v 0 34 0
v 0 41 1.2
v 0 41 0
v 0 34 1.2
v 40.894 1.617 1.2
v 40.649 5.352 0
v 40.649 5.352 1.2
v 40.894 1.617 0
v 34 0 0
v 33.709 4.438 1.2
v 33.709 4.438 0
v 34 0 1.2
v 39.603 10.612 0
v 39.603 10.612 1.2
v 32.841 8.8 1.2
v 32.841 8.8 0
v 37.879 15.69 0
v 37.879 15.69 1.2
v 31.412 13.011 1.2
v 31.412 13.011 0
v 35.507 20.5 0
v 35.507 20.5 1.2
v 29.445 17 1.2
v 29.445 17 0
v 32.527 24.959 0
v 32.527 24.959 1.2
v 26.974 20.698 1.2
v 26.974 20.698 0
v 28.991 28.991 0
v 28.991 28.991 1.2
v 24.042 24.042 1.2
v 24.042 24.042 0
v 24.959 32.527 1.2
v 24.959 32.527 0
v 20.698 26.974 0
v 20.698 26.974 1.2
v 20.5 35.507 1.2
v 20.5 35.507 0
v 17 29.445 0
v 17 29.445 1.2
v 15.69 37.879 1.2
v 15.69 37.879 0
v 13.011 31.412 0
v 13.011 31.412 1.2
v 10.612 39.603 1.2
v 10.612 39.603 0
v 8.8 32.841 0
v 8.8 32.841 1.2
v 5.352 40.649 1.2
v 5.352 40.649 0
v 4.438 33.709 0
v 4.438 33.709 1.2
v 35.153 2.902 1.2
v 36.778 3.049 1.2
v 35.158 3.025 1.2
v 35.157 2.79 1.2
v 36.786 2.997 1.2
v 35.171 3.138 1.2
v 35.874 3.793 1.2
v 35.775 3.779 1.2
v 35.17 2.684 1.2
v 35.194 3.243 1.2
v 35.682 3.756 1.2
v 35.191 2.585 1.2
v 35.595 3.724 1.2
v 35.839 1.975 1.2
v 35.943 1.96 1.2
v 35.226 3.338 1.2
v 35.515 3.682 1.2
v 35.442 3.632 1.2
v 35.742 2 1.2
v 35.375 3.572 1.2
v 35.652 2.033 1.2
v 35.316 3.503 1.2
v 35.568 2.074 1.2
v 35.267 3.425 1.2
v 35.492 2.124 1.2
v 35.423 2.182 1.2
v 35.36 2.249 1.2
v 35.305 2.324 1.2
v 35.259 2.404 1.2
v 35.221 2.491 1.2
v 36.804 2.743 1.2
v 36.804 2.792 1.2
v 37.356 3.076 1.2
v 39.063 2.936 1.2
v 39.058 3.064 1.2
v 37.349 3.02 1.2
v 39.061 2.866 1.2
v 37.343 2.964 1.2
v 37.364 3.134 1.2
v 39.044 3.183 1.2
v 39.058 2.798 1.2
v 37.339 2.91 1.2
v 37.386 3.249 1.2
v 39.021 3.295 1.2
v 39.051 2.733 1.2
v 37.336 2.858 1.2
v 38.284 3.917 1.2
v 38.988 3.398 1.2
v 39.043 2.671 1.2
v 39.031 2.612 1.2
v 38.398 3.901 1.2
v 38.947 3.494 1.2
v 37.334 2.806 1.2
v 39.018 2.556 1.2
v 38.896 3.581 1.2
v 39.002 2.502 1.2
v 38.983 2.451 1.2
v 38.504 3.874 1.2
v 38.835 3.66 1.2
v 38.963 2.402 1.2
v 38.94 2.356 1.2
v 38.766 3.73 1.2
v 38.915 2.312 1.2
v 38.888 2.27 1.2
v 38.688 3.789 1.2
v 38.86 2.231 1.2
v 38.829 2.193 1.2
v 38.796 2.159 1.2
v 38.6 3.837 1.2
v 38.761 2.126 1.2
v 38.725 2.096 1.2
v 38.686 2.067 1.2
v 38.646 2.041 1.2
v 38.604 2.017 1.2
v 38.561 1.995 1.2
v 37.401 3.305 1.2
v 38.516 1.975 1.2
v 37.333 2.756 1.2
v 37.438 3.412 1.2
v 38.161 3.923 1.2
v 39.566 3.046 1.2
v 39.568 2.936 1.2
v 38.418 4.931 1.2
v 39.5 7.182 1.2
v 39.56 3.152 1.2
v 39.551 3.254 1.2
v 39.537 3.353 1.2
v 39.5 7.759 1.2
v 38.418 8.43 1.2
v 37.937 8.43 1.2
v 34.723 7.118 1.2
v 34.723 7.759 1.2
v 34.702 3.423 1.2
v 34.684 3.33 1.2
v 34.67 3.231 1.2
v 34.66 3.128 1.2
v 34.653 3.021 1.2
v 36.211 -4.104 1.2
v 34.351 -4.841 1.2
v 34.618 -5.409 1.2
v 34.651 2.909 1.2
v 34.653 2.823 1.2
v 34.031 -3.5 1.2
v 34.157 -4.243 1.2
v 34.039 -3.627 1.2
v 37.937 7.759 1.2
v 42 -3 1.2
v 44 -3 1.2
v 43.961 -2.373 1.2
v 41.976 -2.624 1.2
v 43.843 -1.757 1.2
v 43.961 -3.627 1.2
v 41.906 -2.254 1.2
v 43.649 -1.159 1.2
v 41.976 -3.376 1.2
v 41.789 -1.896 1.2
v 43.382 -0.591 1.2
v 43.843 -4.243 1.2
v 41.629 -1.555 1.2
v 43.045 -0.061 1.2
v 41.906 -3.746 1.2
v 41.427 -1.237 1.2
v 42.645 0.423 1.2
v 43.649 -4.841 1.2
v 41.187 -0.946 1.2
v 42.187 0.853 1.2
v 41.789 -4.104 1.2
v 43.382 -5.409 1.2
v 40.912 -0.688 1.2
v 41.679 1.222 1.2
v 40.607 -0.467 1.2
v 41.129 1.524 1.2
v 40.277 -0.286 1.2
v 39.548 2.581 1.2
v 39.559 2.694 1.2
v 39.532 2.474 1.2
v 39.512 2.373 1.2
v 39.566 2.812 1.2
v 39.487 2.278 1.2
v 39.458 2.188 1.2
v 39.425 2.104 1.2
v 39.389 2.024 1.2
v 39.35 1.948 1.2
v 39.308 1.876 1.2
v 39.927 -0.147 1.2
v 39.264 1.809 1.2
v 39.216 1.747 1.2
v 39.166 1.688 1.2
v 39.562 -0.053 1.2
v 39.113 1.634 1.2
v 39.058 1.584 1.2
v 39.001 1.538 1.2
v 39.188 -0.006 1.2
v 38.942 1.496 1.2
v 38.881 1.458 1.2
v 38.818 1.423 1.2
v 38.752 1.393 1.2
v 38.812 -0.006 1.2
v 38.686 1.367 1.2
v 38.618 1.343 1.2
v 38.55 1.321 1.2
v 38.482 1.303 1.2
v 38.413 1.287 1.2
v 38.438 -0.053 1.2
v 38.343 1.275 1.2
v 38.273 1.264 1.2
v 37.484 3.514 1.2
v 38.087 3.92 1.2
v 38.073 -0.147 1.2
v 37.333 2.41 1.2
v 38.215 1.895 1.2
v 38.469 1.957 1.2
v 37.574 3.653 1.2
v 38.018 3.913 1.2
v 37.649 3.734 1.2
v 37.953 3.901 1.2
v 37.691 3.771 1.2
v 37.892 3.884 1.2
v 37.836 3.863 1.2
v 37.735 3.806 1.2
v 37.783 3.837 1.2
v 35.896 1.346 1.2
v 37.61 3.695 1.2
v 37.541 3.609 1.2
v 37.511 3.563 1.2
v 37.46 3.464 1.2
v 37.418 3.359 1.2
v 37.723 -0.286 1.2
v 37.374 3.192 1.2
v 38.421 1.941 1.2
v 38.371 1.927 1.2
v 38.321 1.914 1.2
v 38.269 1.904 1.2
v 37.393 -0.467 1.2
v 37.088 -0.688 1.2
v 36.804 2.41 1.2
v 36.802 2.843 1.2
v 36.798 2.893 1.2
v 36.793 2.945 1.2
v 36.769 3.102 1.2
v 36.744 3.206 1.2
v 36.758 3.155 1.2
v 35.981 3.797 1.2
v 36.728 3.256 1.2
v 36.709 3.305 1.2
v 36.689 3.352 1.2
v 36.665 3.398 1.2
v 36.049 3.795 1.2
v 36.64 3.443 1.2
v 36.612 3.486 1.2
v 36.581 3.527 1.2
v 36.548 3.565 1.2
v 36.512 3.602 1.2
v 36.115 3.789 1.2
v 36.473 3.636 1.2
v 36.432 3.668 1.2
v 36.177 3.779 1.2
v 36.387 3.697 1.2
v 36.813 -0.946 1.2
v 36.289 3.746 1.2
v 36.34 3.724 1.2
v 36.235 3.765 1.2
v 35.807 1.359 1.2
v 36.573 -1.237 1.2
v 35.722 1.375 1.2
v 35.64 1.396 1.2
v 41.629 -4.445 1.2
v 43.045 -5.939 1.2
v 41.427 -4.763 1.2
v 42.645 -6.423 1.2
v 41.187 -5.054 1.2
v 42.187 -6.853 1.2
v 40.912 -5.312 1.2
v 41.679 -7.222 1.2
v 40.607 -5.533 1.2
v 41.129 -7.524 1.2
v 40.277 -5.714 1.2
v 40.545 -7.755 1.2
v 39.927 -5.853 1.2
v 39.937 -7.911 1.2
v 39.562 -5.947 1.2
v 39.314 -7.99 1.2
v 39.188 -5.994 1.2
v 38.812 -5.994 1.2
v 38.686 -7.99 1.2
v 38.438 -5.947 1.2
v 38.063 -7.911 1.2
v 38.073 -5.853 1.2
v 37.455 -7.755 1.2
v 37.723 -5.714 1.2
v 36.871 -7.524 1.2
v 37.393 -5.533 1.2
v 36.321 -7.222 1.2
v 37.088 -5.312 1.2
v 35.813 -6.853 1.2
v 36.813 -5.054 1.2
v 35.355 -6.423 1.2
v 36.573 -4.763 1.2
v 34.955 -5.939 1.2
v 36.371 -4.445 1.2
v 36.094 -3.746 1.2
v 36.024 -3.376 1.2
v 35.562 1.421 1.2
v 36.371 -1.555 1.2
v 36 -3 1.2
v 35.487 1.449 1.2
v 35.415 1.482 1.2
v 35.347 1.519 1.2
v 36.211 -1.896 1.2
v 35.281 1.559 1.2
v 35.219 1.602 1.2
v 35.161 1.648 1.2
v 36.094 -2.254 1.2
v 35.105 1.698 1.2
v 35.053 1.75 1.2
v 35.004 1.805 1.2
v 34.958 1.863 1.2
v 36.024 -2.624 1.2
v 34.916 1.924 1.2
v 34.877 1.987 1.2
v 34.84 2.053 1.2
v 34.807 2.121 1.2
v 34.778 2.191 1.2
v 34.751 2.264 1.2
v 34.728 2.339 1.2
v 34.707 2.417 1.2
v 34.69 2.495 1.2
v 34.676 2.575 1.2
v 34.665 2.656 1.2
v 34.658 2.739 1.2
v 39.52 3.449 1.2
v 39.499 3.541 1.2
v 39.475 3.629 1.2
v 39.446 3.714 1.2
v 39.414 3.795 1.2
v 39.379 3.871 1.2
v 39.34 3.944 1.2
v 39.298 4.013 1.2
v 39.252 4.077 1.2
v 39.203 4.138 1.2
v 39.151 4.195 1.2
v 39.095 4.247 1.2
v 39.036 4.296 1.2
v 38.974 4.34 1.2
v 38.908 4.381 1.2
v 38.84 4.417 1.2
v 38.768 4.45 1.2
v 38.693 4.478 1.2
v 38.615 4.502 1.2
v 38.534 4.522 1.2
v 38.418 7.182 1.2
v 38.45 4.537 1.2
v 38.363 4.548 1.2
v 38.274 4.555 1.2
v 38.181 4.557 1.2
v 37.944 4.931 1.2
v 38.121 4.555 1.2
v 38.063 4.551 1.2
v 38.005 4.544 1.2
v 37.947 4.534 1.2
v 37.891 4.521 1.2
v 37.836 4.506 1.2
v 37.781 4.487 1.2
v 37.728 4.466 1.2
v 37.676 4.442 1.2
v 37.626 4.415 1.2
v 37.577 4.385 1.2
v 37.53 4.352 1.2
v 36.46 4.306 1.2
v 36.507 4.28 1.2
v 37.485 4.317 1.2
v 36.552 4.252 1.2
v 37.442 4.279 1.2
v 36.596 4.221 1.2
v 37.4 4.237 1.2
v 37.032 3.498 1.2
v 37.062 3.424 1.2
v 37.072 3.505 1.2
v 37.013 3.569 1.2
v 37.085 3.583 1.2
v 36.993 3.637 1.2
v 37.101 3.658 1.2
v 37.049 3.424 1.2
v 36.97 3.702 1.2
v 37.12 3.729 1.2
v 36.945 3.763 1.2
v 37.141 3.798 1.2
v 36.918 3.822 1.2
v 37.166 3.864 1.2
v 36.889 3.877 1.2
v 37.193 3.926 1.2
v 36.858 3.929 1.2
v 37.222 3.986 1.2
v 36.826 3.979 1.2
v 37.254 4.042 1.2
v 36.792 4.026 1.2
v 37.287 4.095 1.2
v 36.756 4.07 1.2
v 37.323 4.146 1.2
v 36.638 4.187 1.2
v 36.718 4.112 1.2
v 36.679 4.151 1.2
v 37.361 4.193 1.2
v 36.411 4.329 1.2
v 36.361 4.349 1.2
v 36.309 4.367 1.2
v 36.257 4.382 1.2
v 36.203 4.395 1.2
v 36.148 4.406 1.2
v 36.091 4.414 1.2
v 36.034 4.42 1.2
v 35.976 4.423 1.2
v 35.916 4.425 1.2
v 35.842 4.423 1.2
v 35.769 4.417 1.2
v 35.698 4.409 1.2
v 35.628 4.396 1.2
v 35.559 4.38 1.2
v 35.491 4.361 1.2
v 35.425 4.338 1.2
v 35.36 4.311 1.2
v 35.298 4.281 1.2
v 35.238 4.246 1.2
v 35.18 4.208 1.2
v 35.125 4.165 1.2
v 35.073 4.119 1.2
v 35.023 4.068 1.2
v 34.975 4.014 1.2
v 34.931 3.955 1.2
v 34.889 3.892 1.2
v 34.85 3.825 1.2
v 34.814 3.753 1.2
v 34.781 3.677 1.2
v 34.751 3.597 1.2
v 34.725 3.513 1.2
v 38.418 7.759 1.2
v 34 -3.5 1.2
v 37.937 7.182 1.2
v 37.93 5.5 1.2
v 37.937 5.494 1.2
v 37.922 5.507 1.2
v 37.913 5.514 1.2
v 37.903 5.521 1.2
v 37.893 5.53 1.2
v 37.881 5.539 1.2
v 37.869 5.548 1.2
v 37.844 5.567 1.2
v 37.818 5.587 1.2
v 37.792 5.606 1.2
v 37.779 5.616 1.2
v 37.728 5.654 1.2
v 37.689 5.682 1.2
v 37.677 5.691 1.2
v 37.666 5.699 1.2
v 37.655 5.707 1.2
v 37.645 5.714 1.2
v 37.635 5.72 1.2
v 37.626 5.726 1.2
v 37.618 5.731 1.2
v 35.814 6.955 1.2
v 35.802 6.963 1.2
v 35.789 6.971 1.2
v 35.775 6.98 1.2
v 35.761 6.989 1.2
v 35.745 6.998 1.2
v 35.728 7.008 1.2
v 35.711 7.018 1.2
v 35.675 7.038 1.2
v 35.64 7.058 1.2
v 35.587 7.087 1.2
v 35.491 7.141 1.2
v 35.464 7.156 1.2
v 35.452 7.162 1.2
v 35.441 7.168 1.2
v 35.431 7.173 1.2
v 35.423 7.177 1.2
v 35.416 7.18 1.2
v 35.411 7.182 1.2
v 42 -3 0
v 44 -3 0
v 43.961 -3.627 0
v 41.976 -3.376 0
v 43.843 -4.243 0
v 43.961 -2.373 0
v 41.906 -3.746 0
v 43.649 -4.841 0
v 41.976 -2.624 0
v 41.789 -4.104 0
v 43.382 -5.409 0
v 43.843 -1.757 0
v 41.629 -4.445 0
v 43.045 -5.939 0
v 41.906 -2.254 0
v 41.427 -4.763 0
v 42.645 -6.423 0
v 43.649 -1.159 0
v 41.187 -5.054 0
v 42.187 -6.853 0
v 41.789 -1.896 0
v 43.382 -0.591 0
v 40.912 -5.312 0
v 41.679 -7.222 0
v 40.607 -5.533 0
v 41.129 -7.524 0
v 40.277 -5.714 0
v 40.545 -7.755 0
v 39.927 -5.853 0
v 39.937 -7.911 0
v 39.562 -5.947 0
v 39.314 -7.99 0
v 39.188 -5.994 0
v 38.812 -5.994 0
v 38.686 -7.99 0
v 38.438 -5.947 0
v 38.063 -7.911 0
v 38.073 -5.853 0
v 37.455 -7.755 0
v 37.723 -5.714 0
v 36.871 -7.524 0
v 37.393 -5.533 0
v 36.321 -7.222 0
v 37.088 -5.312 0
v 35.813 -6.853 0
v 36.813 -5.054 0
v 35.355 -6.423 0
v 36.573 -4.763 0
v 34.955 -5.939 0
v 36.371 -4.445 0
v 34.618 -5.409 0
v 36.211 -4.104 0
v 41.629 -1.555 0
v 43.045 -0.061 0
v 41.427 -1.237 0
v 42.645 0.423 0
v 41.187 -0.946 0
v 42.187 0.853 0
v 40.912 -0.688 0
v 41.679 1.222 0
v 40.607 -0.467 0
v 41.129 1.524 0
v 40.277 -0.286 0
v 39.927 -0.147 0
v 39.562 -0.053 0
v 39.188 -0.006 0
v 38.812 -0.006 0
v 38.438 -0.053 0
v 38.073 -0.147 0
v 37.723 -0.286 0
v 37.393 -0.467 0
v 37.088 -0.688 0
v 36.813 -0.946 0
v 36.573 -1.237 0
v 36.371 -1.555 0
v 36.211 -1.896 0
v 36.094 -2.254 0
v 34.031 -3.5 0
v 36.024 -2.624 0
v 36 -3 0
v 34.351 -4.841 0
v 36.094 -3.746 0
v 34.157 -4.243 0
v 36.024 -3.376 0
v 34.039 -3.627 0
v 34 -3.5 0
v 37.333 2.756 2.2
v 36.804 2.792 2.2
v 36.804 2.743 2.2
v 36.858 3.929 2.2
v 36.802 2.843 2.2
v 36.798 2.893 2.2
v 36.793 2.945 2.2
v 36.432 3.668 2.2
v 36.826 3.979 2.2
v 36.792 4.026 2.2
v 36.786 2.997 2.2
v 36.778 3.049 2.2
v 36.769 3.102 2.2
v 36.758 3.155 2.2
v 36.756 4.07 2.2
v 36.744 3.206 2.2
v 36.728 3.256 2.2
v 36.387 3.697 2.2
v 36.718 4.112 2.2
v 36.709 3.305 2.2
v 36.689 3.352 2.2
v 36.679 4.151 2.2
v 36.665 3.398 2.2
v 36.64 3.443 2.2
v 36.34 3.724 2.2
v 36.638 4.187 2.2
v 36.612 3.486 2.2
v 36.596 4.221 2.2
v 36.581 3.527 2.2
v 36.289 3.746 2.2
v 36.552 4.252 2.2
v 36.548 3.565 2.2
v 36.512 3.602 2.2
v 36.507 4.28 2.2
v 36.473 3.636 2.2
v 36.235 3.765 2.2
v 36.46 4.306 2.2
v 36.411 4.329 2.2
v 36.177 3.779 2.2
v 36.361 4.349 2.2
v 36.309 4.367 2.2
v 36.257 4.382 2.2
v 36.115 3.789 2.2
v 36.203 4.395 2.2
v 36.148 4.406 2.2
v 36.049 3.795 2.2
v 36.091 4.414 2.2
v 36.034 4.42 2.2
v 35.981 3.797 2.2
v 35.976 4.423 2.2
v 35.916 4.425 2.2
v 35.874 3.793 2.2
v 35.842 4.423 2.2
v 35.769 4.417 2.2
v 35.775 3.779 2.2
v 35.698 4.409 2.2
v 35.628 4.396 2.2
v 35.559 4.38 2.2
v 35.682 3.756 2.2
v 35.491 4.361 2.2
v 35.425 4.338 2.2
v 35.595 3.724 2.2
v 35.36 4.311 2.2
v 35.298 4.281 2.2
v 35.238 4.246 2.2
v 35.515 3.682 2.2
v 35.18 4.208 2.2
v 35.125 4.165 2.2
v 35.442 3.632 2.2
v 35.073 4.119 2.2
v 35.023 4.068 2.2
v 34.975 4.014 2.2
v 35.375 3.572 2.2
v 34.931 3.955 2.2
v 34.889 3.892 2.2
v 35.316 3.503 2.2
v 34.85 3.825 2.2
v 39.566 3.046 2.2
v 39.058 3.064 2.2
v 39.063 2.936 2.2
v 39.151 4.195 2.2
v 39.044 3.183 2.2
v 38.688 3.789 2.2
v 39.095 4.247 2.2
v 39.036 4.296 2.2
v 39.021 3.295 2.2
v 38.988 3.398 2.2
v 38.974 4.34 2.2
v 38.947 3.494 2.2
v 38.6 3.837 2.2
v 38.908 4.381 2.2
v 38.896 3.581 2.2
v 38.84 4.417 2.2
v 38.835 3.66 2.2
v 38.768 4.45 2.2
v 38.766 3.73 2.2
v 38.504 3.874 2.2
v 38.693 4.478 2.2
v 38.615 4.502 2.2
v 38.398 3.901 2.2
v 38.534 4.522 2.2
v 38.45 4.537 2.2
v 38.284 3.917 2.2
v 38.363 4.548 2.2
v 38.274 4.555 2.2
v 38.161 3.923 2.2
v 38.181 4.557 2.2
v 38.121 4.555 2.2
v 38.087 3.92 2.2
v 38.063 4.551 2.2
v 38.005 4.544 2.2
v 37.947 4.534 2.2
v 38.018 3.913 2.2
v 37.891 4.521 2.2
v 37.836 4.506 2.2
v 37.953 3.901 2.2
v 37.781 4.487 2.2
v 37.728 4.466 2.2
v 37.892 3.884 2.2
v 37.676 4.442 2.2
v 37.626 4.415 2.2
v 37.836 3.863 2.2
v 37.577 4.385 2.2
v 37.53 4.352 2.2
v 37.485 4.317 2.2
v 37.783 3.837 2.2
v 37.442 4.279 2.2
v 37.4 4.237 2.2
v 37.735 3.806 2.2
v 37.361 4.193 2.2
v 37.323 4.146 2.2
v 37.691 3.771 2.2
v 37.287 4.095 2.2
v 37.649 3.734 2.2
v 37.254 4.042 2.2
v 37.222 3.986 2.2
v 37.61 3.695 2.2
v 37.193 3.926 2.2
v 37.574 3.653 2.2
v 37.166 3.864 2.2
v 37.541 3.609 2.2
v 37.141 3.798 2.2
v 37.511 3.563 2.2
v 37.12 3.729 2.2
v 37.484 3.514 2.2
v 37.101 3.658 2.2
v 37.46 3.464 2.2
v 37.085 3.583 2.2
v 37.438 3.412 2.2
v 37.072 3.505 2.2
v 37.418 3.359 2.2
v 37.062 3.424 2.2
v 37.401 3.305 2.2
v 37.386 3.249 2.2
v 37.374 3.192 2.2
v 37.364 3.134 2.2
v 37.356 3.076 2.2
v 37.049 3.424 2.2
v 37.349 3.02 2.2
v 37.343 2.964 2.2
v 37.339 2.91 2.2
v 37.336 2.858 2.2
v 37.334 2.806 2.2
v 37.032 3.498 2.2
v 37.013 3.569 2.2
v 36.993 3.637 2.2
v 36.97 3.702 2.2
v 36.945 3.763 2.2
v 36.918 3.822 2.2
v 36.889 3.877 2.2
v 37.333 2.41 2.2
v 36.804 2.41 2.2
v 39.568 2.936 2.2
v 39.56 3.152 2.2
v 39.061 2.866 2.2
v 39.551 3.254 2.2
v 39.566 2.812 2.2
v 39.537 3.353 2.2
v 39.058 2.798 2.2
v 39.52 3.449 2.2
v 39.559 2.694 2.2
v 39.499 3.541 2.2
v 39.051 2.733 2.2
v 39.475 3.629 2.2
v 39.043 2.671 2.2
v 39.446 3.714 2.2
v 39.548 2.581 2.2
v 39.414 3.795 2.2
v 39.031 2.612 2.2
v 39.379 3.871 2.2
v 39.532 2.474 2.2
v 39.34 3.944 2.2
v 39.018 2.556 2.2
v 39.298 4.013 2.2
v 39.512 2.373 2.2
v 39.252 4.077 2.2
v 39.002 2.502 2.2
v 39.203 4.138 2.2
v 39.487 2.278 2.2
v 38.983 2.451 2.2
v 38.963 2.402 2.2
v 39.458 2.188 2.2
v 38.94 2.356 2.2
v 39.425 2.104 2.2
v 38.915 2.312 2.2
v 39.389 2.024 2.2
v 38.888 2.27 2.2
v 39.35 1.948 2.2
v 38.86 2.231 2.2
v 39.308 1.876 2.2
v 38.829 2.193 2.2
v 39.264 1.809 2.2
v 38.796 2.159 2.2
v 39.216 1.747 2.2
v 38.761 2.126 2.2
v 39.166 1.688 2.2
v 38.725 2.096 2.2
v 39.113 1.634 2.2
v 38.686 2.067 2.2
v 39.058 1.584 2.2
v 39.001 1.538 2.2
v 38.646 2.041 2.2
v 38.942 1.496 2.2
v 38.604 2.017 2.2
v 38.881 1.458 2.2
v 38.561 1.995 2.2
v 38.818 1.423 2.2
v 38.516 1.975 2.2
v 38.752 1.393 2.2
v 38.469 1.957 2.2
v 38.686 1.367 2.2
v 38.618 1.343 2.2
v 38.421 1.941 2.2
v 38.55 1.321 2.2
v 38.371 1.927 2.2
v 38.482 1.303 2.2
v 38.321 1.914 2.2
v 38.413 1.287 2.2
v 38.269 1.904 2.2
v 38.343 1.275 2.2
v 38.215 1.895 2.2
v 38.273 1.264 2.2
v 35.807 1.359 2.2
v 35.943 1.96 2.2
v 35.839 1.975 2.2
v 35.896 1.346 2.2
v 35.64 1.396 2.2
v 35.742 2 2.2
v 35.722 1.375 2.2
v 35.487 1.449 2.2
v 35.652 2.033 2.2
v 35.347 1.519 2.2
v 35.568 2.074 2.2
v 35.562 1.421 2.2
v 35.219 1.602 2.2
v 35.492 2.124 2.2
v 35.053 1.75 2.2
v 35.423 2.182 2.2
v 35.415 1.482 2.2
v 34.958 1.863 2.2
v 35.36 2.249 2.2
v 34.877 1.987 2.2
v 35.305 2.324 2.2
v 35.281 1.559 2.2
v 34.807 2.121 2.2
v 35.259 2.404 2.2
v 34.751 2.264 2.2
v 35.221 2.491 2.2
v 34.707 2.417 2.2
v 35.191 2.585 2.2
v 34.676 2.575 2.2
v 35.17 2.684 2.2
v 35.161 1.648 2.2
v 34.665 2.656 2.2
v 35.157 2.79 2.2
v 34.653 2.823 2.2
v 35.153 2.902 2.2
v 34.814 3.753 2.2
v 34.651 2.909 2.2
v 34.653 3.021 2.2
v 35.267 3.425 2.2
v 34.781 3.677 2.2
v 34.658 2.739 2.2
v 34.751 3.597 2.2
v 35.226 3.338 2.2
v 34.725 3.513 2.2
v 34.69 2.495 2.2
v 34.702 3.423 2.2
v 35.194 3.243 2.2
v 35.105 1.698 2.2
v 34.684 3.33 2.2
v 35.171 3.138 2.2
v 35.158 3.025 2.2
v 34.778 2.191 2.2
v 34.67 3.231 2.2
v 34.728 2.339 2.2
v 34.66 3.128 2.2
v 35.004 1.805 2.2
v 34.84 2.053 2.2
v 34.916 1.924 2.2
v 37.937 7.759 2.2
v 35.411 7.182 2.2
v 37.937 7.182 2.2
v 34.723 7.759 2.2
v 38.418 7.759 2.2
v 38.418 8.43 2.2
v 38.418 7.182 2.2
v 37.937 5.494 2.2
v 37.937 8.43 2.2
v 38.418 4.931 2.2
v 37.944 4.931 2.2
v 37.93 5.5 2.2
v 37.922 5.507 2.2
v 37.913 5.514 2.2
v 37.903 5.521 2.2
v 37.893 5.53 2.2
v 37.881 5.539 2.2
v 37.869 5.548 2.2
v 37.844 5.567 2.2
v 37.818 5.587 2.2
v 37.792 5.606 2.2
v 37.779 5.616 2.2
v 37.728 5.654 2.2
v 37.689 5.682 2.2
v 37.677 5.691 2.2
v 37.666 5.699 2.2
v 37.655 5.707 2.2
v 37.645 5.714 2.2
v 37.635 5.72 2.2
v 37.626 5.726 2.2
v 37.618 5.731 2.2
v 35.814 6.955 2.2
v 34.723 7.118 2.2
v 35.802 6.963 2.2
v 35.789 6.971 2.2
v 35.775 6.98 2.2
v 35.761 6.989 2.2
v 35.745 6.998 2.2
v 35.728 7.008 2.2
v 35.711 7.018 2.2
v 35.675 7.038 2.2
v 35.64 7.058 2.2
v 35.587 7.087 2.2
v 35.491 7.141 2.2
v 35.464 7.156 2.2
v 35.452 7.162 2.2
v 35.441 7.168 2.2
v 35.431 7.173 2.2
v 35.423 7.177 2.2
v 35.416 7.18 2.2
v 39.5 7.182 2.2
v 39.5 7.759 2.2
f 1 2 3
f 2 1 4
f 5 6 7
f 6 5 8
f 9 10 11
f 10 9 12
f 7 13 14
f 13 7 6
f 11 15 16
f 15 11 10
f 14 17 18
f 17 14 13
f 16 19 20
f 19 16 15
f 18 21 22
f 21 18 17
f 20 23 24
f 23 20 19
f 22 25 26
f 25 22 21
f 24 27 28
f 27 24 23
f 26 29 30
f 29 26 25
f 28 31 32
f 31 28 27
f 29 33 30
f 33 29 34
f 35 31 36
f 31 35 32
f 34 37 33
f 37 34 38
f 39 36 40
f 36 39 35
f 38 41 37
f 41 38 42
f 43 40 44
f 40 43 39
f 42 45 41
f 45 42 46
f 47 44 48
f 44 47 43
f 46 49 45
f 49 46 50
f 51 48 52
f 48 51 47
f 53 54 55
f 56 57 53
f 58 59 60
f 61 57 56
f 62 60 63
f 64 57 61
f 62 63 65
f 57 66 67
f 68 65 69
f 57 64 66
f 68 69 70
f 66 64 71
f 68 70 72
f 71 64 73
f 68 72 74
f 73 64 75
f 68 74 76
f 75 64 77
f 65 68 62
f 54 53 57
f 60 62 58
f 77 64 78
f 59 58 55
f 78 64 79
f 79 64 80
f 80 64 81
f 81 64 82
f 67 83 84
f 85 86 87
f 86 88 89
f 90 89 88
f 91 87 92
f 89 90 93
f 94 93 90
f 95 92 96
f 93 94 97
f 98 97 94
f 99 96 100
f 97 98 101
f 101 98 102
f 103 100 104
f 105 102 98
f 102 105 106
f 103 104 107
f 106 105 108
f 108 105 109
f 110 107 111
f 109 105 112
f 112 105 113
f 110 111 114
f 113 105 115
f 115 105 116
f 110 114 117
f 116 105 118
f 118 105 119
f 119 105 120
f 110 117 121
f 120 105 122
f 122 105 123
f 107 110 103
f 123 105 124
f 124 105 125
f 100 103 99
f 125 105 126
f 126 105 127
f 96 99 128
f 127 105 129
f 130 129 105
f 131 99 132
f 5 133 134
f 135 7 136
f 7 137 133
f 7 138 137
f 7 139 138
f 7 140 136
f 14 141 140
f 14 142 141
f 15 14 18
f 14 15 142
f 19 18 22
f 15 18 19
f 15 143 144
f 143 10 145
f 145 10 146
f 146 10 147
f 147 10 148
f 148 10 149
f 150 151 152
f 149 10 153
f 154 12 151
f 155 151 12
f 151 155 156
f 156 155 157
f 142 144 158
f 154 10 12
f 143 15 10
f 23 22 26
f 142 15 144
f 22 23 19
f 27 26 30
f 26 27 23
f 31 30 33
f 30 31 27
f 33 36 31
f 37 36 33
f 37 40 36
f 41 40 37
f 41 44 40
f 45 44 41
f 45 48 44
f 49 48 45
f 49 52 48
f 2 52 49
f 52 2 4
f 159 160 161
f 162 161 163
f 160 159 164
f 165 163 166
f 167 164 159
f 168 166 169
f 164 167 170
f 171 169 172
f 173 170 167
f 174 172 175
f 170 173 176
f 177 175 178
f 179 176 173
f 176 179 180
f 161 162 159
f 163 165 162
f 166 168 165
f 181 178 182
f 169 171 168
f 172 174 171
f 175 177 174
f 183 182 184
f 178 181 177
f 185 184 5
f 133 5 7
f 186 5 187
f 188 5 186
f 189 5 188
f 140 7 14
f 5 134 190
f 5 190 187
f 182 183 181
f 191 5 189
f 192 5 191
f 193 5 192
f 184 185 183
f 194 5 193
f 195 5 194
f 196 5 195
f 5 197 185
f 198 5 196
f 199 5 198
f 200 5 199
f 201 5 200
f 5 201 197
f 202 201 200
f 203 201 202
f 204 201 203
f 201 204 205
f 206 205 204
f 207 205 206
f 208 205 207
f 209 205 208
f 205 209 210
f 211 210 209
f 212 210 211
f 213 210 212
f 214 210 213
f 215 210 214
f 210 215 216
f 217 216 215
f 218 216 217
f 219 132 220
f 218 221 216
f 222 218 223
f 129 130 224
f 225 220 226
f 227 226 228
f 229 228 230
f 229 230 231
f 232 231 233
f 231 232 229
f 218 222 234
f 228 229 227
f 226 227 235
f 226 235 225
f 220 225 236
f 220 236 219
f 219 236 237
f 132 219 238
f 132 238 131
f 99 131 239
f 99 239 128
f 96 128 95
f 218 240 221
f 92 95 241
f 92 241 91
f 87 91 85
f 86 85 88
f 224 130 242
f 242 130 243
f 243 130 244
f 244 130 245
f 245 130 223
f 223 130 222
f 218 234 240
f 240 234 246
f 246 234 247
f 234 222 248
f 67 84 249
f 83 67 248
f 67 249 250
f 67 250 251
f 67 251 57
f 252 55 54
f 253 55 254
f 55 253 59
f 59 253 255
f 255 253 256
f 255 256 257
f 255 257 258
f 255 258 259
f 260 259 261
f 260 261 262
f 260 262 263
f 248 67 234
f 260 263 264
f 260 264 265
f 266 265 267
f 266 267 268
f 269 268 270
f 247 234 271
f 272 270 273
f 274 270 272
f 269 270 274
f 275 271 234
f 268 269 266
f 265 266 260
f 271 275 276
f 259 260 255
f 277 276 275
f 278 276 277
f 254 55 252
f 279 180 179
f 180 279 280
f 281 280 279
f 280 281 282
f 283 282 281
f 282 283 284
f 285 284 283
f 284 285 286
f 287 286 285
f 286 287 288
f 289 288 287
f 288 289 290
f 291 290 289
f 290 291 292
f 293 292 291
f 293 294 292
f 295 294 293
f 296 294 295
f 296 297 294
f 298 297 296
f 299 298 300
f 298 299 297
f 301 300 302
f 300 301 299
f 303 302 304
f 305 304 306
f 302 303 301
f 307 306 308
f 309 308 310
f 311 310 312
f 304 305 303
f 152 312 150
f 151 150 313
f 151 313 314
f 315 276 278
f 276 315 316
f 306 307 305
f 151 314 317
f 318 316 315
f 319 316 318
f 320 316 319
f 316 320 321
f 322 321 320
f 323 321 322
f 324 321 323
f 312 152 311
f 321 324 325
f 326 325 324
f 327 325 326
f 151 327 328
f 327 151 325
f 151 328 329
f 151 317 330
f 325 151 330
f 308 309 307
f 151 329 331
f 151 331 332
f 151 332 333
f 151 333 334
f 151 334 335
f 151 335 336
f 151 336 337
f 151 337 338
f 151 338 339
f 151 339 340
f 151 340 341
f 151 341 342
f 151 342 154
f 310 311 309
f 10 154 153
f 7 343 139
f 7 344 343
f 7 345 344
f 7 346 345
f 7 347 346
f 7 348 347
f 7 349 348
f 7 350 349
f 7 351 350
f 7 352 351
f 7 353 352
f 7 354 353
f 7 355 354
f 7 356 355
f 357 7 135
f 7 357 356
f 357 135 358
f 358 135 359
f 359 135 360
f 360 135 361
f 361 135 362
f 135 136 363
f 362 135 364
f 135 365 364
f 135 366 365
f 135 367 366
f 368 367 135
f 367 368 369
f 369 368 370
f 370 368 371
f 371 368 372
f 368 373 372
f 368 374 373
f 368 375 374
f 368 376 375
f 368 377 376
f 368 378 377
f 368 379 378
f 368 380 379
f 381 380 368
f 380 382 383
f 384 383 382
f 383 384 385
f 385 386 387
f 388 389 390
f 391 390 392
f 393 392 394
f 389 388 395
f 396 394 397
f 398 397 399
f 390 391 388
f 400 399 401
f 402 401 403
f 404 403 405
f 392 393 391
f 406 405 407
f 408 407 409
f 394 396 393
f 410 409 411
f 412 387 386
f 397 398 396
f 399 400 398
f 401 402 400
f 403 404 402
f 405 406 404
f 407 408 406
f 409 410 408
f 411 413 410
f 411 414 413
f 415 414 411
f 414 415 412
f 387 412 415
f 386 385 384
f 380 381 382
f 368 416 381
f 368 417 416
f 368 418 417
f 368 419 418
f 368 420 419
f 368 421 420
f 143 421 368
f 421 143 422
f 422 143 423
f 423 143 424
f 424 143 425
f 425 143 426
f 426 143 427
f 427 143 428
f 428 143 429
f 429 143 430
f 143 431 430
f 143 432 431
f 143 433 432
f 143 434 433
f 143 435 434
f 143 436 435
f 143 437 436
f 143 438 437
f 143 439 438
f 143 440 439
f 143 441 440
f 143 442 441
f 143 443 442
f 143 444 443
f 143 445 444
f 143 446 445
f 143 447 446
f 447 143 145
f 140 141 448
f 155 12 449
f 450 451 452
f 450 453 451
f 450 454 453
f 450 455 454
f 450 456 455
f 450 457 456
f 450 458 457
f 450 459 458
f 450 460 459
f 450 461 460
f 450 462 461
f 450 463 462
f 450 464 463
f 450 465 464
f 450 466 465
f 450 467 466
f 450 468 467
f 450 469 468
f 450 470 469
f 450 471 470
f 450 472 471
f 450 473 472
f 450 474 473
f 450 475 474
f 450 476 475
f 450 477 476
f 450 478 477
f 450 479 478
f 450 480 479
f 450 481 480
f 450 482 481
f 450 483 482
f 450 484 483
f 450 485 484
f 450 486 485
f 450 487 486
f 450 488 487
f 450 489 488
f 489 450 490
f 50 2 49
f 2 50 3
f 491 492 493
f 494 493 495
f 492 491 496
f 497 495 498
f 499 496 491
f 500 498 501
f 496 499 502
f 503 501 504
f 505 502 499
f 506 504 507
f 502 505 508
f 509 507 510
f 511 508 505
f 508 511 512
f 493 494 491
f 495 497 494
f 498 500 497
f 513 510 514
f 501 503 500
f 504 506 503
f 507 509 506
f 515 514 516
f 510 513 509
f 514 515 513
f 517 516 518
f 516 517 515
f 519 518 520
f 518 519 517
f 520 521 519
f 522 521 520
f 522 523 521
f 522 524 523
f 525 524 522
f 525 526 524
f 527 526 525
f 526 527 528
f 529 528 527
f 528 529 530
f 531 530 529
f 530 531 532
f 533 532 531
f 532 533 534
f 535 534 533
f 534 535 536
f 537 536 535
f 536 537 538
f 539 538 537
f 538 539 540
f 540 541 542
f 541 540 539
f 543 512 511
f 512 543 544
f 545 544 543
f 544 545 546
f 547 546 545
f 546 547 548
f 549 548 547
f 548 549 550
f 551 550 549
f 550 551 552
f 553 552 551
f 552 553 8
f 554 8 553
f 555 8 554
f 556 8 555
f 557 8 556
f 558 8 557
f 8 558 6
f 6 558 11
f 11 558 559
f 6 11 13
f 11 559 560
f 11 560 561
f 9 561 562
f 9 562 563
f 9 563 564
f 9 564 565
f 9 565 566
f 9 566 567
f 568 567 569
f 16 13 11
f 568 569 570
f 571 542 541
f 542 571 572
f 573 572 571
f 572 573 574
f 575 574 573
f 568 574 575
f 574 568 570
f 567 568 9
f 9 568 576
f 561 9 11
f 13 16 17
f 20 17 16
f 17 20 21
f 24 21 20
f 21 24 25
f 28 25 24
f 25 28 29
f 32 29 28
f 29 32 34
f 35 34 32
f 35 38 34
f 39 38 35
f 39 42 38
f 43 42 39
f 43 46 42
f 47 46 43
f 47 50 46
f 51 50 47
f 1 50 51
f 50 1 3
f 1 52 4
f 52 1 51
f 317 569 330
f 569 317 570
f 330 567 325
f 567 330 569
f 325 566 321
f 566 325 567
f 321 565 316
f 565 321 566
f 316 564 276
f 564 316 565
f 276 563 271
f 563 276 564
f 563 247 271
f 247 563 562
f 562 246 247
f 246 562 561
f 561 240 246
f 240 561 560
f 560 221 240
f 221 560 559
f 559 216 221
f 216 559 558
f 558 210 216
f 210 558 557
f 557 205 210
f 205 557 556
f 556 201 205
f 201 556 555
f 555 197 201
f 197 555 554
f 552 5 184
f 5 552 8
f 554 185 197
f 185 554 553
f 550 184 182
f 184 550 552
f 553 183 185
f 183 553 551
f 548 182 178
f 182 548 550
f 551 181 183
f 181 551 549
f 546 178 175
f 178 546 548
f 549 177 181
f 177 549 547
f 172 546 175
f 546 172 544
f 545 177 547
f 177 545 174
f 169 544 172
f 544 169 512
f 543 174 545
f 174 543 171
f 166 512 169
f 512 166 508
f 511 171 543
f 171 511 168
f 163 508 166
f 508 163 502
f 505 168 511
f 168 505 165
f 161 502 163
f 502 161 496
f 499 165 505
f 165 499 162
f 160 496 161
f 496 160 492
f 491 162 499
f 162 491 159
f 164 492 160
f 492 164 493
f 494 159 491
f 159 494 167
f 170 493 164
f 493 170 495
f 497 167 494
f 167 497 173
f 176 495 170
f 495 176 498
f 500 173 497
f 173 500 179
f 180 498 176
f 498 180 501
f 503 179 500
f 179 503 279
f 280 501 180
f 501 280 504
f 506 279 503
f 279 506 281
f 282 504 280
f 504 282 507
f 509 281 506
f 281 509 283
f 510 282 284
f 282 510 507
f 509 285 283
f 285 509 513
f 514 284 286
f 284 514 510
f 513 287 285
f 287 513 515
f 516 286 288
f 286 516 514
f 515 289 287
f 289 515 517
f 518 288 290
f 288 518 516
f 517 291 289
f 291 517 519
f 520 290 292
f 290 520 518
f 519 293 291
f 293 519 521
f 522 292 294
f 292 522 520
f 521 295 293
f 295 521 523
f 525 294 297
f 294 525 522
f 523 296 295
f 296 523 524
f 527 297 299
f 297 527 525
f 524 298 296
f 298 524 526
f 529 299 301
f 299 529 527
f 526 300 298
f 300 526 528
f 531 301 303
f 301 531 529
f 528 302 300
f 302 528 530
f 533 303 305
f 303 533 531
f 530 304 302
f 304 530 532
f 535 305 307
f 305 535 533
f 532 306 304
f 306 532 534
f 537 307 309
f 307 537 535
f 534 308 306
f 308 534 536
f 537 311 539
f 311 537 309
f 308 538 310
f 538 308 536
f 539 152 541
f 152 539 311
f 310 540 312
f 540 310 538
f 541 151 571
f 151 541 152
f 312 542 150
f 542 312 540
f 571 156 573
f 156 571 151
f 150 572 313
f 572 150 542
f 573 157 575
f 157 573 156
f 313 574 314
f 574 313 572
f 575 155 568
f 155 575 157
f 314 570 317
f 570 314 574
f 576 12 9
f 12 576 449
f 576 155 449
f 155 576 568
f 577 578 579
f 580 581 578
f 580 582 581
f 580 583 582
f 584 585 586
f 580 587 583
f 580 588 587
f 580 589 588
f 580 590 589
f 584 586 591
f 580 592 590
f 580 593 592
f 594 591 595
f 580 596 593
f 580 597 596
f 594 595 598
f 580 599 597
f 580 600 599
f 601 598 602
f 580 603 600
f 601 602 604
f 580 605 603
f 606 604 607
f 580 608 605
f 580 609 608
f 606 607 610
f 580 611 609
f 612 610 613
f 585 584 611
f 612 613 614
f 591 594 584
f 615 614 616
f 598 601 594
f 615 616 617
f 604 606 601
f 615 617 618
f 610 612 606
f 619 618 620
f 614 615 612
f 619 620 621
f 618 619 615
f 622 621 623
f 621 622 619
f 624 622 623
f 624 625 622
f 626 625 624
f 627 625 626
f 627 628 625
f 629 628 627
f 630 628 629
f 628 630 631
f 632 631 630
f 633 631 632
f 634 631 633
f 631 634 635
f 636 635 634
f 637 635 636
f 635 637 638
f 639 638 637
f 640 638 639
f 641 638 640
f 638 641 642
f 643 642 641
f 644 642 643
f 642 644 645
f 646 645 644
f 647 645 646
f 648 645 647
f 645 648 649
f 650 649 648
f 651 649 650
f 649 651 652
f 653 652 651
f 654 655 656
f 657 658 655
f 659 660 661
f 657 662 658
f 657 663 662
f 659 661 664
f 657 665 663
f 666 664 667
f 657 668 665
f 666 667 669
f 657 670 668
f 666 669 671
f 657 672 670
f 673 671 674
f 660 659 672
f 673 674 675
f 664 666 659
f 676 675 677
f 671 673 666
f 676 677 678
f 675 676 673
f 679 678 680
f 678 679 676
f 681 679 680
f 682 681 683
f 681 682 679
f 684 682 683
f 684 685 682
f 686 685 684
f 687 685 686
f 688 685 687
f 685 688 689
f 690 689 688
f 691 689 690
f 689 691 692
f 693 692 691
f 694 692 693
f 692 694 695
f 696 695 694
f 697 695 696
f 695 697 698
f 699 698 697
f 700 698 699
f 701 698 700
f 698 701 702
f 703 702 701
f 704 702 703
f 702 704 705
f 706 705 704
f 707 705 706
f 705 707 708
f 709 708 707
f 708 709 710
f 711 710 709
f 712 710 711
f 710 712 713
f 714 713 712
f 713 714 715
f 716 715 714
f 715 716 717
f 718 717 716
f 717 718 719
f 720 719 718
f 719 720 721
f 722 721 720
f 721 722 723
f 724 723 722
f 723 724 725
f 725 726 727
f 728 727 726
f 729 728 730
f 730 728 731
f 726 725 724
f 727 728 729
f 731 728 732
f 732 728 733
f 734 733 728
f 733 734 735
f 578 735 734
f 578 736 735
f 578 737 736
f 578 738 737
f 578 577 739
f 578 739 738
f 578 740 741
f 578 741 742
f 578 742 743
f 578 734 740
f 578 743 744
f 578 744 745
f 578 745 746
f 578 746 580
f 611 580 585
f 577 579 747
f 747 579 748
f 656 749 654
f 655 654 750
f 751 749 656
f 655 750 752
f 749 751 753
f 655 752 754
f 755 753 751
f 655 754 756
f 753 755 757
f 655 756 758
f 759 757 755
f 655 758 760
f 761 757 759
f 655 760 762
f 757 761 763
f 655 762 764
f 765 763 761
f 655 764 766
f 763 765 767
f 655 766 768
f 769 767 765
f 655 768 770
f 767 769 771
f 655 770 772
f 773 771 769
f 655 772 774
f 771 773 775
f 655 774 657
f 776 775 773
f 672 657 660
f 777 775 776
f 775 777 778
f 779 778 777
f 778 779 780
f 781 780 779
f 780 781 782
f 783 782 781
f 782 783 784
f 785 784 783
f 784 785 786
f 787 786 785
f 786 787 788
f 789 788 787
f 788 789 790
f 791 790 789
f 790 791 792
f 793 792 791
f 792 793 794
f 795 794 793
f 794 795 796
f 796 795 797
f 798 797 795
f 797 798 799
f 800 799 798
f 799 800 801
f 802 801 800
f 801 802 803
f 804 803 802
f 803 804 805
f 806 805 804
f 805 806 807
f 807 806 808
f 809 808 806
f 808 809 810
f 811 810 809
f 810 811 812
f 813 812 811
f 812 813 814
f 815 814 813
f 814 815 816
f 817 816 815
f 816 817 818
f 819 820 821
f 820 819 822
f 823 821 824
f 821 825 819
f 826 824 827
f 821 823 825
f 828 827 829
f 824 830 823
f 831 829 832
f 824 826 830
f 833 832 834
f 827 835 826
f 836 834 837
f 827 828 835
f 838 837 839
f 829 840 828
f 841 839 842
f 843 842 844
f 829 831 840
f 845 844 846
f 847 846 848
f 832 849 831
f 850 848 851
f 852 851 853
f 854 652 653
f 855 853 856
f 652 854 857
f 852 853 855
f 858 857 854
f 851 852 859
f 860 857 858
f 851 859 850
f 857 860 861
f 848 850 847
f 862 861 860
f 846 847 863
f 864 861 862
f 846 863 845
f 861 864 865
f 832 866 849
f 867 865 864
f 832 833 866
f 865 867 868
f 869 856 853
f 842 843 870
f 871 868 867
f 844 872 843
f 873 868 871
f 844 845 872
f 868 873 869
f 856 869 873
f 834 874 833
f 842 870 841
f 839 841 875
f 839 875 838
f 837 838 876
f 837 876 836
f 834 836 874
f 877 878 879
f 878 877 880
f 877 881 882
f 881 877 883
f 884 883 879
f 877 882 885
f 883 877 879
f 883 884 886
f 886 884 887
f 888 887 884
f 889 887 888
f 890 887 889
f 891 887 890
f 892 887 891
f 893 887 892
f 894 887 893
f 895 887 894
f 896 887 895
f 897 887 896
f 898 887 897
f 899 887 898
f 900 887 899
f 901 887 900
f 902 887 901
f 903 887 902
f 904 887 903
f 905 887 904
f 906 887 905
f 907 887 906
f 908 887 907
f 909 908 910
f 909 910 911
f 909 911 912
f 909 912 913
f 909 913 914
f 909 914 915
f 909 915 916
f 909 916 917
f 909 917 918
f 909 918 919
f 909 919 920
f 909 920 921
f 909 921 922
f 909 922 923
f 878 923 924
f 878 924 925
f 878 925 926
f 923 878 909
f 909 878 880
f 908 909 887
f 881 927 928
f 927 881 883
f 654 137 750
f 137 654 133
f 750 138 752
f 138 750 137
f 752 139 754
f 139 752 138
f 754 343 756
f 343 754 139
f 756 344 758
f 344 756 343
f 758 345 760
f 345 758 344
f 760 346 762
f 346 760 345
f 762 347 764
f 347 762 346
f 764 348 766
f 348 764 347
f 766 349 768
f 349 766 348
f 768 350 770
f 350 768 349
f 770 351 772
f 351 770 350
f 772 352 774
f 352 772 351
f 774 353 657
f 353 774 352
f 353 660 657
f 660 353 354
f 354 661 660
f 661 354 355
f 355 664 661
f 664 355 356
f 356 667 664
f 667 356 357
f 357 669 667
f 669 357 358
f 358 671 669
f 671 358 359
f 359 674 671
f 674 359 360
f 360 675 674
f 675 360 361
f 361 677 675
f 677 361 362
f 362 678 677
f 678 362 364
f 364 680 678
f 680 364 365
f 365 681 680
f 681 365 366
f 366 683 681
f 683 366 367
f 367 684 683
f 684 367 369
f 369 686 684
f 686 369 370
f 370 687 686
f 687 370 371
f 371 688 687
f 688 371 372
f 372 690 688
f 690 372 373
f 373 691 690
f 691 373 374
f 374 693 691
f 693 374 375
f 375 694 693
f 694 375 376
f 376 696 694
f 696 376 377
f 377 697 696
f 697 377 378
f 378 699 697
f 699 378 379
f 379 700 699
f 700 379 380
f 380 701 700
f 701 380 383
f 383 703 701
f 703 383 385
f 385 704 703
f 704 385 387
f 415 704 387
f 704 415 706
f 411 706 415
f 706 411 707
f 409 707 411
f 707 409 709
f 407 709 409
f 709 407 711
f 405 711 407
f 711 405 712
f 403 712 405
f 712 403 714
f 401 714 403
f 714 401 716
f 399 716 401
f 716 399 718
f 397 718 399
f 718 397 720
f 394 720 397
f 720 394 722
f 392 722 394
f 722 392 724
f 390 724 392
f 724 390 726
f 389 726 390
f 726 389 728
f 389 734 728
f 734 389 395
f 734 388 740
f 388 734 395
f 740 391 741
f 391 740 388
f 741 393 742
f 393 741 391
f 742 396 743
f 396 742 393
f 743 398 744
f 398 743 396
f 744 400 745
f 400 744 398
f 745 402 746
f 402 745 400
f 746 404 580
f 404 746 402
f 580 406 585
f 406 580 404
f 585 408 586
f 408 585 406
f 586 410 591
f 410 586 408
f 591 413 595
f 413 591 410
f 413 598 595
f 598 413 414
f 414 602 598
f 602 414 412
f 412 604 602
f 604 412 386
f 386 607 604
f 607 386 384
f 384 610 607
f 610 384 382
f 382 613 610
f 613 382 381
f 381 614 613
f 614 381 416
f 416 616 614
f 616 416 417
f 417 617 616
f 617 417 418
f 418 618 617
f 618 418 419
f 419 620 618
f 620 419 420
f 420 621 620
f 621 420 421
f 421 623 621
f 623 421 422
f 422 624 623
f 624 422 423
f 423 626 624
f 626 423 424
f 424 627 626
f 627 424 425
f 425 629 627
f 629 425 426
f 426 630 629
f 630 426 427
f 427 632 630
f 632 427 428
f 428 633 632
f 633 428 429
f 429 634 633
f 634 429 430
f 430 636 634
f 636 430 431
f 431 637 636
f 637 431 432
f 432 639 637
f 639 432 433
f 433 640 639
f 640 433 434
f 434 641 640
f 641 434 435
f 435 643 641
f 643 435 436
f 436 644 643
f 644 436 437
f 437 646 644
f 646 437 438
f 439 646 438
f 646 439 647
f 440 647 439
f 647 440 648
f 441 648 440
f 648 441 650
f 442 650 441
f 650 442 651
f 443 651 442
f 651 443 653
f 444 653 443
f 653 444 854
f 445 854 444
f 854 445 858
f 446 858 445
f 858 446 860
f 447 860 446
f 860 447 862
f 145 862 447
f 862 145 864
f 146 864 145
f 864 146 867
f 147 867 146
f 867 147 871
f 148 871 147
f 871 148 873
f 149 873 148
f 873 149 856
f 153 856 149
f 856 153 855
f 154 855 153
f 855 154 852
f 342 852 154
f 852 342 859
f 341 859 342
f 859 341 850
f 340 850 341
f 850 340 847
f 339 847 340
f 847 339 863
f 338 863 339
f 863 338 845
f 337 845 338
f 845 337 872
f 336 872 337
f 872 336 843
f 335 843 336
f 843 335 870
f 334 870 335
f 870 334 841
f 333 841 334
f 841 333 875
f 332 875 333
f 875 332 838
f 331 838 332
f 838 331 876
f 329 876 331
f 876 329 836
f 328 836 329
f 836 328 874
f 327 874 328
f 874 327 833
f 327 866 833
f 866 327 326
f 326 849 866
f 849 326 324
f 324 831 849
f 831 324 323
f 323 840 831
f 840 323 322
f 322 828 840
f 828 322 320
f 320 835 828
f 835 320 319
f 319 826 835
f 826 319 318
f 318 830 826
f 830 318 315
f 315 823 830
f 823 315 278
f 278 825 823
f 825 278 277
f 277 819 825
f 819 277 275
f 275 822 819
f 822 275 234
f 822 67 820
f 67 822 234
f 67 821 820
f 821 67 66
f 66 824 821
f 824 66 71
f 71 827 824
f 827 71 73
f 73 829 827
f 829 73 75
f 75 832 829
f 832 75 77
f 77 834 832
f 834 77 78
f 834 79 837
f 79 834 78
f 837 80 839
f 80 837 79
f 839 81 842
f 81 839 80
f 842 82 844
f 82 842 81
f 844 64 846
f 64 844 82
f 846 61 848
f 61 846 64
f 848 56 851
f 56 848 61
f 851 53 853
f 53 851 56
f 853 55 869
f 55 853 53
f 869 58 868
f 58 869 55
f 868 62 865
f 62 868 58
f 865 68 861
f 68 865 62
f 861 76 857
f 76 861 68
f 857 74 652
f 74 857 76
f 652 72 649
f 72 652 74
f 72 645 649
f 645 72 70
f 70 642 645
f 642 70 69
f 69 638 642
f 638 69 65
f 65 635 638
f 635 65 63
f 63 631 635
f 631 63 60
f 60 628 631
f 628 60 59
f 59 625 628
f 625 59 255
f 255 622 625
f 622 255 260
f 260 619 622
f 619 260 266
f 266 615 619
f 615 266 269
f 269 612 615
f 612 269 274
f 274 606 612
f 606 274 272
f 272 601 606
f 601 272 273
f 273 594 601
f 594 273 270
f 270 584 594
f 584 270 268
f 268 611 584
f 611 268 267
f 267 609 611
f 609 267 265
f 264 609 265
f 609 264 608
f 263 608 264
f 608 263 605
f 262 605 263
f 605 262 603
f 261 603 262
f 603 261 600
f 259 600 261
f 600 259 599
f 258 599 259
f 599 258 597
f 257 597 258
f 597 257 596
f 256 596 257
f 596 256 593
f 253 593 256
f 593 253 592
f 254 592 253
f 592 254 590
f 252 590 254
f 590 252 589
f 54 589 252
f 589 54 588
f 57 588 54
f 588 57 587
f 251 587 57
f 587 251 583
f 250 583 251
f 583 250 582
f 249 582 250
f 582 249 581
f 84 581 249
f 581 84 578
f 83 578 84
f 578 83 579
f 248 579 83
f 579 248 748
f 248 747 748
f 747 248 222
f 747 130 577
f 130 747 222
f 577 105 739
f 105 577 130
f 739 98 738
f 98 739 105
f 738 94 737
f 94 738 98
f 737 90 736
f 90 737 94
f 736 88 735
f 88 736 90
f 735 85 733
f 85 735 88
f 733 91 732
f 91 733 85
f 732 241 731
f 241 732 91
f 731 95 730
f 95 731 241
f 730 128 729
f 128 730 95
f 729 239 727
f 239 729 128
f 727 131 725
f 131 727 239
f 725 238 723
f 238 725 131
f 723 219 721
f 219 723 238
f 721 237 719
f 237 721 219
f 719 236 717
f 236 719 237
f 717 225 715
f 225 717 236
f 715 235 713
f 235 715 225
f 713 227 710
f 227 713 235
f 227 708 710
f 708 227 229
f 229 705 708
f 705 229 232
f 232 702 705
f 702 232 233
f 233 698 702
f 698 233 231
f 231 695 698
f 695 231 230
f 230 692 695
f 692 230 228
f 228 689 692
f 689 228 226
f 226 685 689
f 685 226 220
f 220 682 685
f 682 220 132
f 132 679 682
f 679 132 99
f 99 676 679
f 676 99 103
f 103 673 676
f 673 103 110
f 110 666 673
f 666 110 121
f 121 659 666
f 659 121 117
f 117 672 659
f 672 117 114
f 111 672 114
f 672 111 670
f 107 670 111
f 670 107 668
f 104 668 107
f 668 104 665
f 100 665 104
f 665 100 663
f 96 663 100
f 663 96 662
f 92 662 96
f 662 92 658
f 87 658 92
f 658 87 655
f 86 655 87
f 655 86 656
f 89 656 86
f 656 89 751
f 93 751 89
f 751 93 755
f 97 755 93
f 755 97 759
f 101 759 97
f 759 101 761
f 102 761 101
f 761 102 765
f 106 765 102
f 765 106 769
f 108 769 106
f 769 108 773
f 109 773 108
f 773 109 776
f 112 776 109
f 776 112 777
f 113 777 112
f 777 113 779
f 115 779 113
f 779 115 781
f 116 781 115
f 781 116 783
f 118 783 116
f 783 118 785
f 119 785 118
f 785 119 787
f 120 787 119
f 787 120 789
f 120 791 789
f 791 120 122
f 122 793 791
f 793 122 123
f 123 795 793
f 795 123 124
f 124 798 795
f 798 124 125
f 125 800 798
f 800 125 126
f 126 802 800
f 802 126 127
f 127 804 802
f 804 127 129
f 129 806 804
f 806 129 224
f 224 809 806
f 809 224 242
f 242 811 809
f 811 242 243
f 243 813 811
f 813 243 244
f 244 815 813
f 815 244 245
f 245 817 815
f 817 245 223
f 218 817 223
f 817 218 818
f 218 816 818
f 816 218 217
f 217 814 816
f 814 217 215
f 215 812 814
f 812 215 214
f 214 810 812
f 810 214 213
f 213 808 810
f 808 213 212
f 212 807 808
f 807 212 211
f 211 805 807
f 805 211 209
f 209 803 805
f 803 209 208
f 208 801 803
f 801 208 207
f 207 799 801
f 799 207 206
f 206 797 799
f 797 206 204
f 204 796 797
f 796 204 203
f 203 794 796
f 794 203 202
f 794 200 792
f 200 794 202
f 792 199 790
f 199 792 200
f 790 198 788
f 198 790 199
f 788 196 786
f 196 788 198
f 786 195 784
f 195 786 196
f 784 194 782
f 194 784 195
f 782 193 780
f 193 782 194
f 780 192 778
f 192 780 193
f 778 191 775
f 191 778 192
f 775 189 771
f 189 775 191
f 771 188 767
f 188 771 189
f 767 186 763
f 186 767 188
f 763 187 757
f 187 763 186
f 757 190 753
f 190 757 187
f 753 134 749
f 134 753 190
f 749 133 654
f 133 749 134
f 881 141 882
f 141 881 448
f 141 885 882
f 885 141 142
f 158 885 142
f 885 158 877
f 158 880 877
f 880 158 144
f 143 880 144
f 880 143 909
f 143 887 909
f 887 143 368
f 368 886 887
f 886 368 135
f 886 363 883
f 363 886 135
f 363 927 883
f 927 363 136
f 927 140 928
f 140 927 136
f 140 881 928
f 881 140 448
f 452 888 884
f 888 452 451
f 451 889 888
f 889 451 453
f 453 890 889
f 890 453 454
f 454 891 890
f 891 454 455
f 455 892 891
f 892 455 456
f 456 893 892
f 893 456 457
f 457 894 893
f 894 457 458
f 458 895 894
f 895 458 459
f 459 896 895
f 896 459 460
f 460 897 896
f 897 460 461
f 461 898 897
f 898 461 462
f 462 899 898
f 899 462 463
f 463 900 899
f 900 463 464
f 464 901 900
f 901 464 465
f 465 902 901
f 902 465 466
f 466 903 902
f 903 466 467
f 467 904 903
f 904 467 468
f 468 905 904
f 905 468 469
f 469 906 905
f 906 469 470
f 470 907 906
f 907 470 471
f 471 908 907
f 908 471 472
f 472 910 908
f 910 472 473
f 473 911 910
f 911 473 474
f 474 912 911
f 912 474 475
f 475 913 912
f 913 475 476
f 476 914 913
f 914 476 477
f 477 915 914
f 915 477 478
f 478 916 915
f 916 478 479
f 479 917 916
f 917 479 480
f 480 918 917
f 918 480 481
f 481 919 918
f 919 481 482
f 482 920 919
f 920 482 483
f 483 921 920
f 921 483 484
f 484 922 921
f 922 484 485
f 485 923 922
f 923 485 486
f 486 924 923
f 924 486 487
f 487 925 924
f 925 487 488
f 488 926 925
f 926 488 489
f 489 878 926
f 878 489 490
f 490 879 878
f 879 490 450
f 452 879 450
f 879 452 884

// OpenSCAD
// file: funciones.scad
   
module translate_giro(d, angulo) {
    translate([-d * cos(180-angulo), d * sin(180-angulo), 0])
        rotate(angulo)
            children();
}

module raise(z) {
    translate([0, 0, z]) children();
}

module semiesfera(di) {
    intersection() {
        sphere(d=di);
        translate([di/4, 0]) cube([di/2, di, di], true);
    }
}


module semiesfera_redondeada(diametro, diametro_redondeo = 0) {
    diametro_redondeo = diametro_redondeo == 0 ? diametro / 4 : diametro_redondeo;
    
    diametro2 = diametro / 2;
    diametro_redondeo2 = diametro_redondeo / 2;
    ddr2 = diametro2 - diametro_redondeo2;
    
    union () {
        translate([diametro_redondeo2, 0, 0]) resize([ddr2, diametro, diametro]) semiesfera(diametro);
        
        intersection() {
            translate([diametro_redondeo2, 0, 0]) rotate([0, 90]) toro(diametro, diametro_redondeo);
            translate([diametro_redondeo2 /2, 0, 0]) cube([diametro_redondeo2, diametro, diametro], true);
        }
        
        rotate([0, 90]) cylinder(diametro_redondeo2, d=diametro - diametro_redondeo);
    }
}

module cuartoesfera(di) {
    intersection() {
        sphere(d=di);
        translate([di/4, di/4]) cube([di/2, di/2, di], true);
    }
}

module cuartoesfera_aplastada(di, ancho, x = true) {
    if (x)
        resize([ancho/2, di/2, di]) cuartoesfera(di);
    else
        rotate(90) resize([di/2, ancho/2, di]) cuartoesfera(di);
}

module semicircle(diametro) {
    intersection() {
        circle(d=diametro);
        translate([diametro/4, 0]) square([diametro/2, diametro], true);
    }
}

module semicircle_redondeado(diametro, diametro_redondeo = 0) {
    diametro_redondeo = diametro_redondeo == 0 ? diametro / 4 : diametro_redondeo;
    
    translate([diametro_redondeo/2, 0]) resize([diametro/2 - diametro_redondeo/2, diametro]) semicircle(diametro);
    translate([diametro_redondeo/2, diametro/2 - diametro_redondeo/2]) rotate(90) cuartocircle(diametro_redondeo);
    translate([diametro_redondeo/2, -(diametro/2 - diametro_redondeo/2)]) rotate(180) cuartocircle(diametro_redondeo);
    translate([diametro_redondeo/4, 0]) square([diametro_redondeo/2, diametro - diametro_redondeo], true);
}

module cuartocircle(diametro) {
    intersection() {
        circle(d=diametro);
        translate([diametro/4, diametro/4]) square([diametro/2, diametro/2], true);
    }
}

module talla_cuartocircle(radio) {
    difference() {
        square(radio);
        circle(radio);
    }
}

module semicylinder(altura, diametro) {
    intersection() {
        cylinder(altura, d=diametro);
        translate([0, -diametro/2, 0]) cube([diametro/2, diametro, altura]);
    }
}

module semicylinder_hueco(altura, diametro, grosor) {
    // Queda feo en la previsualizacion
    //
    // difference() {
    //     semicylinder(altura, diametro);
    //     semicylinder(altura, diametro-grosor);
    // }
    
    rotate(-90) rotate_extrude(angle=180) translate([diametro/2 - grosor, 0]) square([grosor, altura]);
}

module cuartocylinder_hueco(altura, diametro, grosor) {
    rotate(0) rotate_extrude(angle=90) translate([diametro/2 - grosor, 0]) square([grosor, altura]);
}

module cylinder_hueco(altura, diametro, grosor) {
    rotate_extrude(angle=360) translate([diametro/2 - grosor, 0]) square([grosor, altura]);
}

module toro_parcial(diametro_grande, diametro_pequeno, angulo) {
    rotate_extrude(angle=angulo)
        translate([diametro_grande/2 - diametro_pequeno / 2, 0])
            circle(d=diametro_pequeno);
}

function radio_horizontal(radio, altura_desde_arriba) = radio*sin(acos((radio-altura_desde_arriba)/radio));

module toro(diametro_grande, diametro_pequeno) {
    rotate_extrude()
        translate([diametro_grande/2 - diametro_pequeno / 2, 0])
            circle(d=diametro_pequeno);
}

module talla_semicilindro(ancho, largo) {
    difference() {
        cube([ancho/2, largo, ancho], true);
        translate([-ancho/4, largo/2, 0]) rotate([90, 0]) cylinder(largo, d=ancho);
    }
}

module talla_cuartocirculo(ancho, largo) {
    difference() {
        cube([ancho, largo, ancho], true);
        translate([-ancho/2, largo/2, -ancho/2]) rotate([90, 0]) cylinder(largo, d=ancho*2);
    }
}

module sector_circular(diametro, angulo) {
    angulo2 = angulo / 2;
    
    if (0 == angulo) {
        // Nothing
    } else if (360 <= angulo) {
        circle(d = diametro);
    } else if (180 <= angulo) {
        union () {
            difference() {
                circle(d = diametro);
                color("red") rotate(angulo2) translate([0, diametro/4]) square([diametro, diametro/2], true);
            }
            
            difference() {
                circle(d = diametro);
                color("purple") rotate(360-angulo2) translate([0, -diametro/4]) square([diametro, diametro/2], true);
            }
        }
    } else {
        difference() {
            circle(d = diametro);
            color("red") rotate(angulo2) translate([0, diametro/4]) square([diametro, diametro/2], true);
            color("purple") rotate(360-angulo2) translate([0, -diametro/4]) square([diametro, diametro/2], true);
        }
    }
}

module talla_semicirculo(diametro, rotacion = 0, sobresaliente = 0) {
    rotate(rotacion) 
        difference() {
            square([diametro / 2 + sobresaliente * 2, diametro + sobresaliente], true);
            translate([-diametro / 4, 0]) circle(d = diametro);
            translate([-sobresaliente/2 -diametro/4 - 0.5, 0]) square([sobresaliente + 1, diametro], true);
        }
}

module arco_redondeado(diametro, grosor, angulo, bolas_en_exterior = true) {
    $fn = 100;

    diametro2         = diametro / 2;
    grosor2           = grosor / 2;
    diametro_medio    = diametro2 - grosor2;
    diametro_interior = diametro - 2 * grosor;
    alpha             = asin(grosor2 / diametro_medio);
    angulo            = bolas_en_exterior ? angulo : angulo - 2 * alpha;
    angulo2           = angulo / 2;
    
    union() {
        difference() {
            sector_circular(diametro, angulo);
            sector_circular(diametro_interior, angulo + 10);
        }
        
        color("red") translate_giro(diametro_medio, angulo2)  circle(d=grosor);
        color("red") translate_giro(diametro_medio, -angulo2) circle(d=grosor);
    }
}
// main file
use <funciones.scad>

$fn = 50;
altura = 1.2;
ancho = 7;
largo = 50;
alto_texto = ancho - 1;

module curva(radio) {
    _radio = radio + ancho;
    alto_texto = alto_texto - 1;
    
    cuartocylinder_hueco(altura, 2 * _radio, ancho);
    translate([_radio - 2, -3, 0]) cylinder_hueco(altura, 10, 2);
    translate([_radio - ancho,-3.5,0])cube([2, 5, altura]);
    
    translate([_radio - (ancho/2 - alto_texto/2+0.5), 1, 0]) linear_extrude(altura + 1) rotate(90) text(str(radio), alto_texto);
}

curva(34);
//angulo(150);


module angulo(angulo_) {
    translate([-3, 2, 0]) cylinder_hueco(altura, 10, 2);
    translate([-3.5,ancho-2,0])cube([5, 2, altura]);
    
     cube([largo, ancho, altura]);
    
     minkowski() {
         if (angulo_ <= 90) {
            translate([largo, ancho]) rotate(180-angulo_) cube([largo, 0.01, 0.01]);
         } else {
            translate([largo, 0]) rotate(180-angulo_) cube([largo, 0.01, 0.01]);
         }
         rotate(180-angulo_) cube([0.01, ancho, grosor]) ;
     }
    
    translate([1, (ancho/2 - alto_texto/2), 0]) linear_extrude(altura  + 1) text(str(angulo_), alto_texto);
}
